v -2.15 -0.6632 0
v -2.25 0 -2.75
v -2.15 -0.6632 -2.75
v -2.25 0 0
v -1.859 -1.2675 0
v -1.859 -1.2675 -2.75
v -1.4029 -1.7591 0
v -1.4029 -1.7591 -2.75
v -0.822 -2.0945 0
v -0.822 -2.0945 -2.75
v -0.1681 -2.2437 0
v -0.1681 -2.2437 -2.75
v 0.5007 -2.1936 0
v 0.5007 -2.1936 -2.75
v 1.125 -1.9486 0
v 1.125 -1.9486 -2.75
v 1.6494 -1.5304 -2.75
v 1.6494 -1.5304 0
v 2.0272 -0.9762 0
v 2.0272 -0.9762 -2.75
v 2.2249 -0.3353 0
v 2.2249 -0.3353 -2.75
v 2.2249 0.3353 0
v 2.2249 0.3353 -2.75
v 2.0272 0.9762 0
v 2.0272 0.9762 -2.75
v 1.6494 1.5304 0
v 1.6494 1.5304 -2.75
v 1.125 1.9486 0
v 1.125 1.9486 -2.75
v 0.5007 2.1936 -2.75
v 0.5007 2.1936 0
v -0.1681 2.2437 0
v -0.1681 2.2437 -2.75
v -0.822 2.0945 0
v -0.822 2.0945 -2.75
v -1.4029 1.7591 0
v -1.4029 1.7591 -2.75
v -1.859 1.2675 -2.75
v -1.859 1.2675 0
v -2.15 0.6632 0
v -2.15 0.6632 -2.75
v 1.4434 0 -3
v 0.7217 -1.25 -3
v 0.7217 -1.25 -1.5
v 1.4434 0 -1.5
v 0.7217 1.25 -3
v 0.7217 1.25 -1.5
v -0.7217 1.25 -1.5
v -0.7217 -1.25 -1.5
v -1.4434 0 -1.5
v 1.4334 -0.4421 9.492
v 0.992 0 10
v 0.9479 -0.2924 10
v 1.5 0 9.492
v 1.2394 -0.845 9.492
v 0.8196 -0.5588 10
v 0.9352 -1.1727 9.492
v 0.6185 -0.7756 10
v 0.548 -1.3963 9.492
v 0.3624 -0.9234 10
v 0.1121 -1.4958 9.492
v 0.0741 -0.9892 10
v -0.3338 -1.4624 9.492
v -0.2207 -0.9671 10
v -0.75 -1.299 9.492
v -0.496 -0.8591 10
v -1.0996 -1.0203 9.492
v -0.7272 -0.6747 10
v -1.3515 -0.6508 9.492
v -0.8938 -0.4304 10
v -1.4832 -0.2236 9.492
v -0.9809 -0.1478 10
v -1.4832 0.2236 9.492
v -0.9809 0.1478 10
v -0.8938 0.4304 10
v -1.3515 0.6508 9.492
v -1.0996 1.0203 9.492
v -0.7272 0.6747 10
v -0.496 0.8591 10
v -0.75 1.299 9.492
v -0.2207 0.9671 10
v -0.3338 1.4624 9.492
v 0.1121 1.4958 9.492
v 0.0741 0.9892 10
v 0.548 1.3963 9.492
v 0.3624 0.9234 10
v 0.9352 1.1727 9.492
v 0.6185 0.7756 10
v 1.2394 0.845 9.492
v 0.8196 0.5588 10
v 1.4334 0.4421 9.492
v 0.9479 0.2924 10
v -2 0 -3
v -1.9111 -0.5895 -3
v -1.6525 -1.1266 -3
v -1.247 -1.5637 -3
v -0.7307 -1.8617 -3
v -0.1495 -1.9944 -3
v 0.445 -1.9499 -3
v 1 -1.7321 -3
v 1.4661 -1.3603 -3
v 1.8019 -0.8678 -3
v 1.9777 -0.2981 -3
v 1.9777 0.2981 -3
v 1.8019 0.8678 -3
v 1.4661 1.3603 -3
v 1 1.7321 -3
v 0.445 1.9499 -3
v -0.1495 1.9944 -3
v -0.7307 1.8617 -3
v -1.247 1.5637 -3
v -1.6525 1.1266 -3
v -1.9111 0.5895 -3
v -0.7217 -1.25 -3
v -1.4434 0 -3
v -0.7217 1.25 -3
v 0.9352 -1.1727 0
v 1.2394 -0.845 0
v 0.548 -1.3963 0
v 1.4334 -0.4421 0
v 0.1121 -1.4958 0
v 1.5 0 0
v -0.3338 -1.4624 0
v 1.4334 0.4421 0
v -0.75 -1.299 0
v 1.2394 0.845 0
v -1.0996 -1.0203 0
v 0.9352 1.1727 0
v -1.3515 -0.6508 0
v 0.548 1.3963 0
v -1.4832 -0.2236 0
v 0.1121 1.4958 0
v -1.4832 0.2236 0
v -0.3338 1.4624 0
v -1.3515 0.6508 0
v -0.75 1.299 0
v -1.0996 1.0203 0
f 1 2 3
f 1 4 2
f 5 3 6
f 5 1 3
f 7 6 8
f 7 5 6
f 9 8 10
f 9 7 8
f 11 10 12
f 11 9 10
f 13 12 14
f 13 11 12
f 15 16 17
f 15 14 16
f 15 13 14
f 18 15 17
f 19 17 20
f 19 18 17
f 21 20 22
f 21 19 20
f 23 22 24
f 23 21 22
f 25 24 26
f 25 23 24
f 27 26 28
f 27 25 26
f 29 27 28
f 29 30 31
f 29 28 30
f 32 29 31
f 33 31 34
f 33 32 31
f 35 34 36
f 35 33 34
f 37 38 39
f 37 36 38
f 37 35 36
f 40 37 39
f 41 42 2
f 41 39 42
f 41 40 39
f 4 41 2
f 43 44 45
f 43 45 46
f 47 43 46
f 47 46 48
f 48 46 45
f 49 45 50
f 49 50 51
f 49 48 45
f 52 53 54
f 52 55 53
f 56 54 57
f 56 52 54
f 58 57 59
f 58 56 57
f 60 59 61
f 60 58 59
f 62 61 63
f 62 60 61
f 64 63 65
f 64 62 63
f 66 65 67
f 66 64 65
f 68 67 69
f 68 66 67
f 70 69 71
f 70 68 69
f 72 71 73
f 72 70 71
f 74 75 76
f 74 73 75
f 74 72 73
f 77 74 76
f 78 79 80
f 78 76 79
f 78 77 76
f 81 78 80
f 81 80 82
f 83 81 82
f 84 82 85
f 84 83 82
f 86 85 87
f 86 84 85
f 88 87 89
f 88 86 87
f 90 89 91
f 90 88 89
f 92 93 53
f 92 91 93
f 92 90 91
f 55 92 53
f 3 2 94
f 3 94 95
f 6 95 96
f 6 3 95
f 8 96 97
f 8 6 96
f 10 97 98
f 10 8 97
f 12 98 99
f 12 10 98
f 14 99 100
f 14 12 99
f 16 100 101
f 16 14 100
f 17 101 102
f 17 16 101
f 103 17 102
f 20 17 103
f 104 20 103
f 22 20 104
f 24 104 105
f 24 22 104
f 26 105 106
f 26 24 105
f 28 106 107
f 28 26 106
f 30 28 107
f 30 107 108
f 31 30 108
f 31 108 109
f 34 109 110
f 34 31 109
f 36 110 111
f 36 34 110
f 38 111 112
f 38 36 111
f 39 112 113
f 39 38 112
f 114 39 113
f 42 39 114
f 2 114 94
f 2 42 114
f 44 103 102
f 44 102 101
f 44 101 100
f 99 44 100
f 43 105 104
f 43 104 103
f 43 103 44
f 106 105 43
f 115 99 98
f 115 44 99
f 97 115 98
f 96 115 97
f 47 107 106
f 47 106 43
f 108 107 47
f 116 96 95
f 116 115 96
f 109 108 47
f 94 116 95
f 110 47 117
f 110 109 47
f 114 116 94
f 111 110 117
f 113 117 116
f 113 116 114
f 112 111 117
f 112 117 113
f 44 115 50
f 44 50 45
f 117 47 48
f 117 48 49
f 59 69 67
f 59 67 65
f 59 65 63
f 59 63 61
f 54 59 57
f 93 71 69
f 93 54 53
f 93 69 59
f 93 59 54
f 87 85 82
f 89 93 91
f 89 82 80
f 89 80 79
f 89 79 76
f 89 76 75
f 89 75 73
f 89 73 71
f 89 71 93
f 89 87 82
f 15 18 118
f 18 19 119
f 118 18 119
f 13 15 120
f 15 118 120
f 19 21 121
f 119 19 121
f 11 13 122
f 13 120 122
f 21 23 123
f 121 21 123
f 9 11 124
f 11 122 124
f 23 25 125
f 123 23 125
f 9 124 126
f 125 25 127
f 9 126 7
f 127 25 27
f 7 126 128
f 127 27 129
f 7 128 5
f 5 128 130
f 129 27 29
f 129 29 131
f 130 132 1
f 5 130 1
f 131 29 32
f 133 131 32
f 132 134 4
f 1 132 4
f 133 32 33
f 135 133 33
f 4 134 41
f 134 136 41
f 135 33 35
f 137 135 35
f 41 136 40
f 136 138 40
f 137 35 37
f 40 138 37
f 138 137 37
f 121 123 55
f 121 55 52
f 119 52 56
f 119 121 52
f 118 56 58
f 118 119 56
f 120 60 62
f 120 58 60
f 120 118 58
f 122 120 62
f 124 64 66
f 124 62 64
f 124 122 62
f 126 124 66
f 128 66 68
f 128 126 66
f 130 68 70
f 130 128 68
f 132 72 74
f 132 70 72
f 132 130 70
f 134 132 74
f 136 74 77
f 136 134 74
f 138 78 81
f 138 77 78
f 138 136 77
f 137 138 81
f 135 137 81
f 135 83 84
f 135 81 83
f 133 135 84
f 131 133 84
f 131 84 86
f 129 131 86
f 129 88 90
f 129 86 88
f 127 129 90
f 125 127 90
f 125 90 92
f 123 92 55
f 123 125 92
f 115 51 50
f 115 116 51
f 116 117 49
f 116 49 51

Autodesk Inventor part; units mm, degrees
ref_plane "YZ Plane" through (0, 0, 0) normal (1, 0, 0) x (0, 1, 0)
ref_plane "XZ Plane" through (0, 0, 0) normal (0, 1, 0) x (-1, 0, 0)
ref_plane "XY Plane" through (0, 0, 0) normal (0, 0, 1) x (1, 0, 0)
sketch "Sketch1" plane through (0, 0, 0) normal (0, 0, 1) x (1, 0, 0)
  circle A0 centre (0, 0) radius 1.5
  dimension "d0" = 3
extrude "Extrusion1" add sketch "Sketch1" along normal blind 10
sketch "Sketch2" plane through (0, 0, 0) normal (0, 0, -1) x (-1, 0, 0)
  circle A0 centre (0, 0) radius 1.5 projected
  circle A1 centre (0, 0) radius 2.25
  dimension "d3" = 4.5
extrude "Extrusion2" add sketch "Sketch2" along normal blind 3 contours A0 | A1
sketch "Sketch3" plane through (0, 0, -3) normal (0, 0, -1) x (-1, 0, 0)
  circle A0 centre (0, 0) radius 2.25 projected
  line L0 (-0.7217, 1.25) -> (0.7217, 1.25)
  line L1 (0.7217, 1.25) -> (1.4434, 0)
  line L2 (1.4434, 0) -> (0.7217, -1.25)
  line L3 (0.7217, -1.25) -> (-0.7217, -1.25)
  line L4 (-0.7217, -1.25) -> (-1.4434, 0)
  line L5 (-1.4434, 0) -> (-0.7217, 1.25)
  dimension "d6" = 2.5
extrude "Extrusion3" cut sketch "Sketch3" against normal blind 1.5 contours L0 L1 L2 L3 L4 L5
thread "Thread1" size "M3x0.5" class "6g" standard "ANSI Metric M Profile" full length
chamfer "Chamfer1" distance 0.508 angle 45 1 edges at (-1.5, 0, 10)
chamfer "Chamfer2" distance 0.25 angle 45 1 edges at (2.25, 0, -3)
properties part number "m3 x10" material "Steel"
